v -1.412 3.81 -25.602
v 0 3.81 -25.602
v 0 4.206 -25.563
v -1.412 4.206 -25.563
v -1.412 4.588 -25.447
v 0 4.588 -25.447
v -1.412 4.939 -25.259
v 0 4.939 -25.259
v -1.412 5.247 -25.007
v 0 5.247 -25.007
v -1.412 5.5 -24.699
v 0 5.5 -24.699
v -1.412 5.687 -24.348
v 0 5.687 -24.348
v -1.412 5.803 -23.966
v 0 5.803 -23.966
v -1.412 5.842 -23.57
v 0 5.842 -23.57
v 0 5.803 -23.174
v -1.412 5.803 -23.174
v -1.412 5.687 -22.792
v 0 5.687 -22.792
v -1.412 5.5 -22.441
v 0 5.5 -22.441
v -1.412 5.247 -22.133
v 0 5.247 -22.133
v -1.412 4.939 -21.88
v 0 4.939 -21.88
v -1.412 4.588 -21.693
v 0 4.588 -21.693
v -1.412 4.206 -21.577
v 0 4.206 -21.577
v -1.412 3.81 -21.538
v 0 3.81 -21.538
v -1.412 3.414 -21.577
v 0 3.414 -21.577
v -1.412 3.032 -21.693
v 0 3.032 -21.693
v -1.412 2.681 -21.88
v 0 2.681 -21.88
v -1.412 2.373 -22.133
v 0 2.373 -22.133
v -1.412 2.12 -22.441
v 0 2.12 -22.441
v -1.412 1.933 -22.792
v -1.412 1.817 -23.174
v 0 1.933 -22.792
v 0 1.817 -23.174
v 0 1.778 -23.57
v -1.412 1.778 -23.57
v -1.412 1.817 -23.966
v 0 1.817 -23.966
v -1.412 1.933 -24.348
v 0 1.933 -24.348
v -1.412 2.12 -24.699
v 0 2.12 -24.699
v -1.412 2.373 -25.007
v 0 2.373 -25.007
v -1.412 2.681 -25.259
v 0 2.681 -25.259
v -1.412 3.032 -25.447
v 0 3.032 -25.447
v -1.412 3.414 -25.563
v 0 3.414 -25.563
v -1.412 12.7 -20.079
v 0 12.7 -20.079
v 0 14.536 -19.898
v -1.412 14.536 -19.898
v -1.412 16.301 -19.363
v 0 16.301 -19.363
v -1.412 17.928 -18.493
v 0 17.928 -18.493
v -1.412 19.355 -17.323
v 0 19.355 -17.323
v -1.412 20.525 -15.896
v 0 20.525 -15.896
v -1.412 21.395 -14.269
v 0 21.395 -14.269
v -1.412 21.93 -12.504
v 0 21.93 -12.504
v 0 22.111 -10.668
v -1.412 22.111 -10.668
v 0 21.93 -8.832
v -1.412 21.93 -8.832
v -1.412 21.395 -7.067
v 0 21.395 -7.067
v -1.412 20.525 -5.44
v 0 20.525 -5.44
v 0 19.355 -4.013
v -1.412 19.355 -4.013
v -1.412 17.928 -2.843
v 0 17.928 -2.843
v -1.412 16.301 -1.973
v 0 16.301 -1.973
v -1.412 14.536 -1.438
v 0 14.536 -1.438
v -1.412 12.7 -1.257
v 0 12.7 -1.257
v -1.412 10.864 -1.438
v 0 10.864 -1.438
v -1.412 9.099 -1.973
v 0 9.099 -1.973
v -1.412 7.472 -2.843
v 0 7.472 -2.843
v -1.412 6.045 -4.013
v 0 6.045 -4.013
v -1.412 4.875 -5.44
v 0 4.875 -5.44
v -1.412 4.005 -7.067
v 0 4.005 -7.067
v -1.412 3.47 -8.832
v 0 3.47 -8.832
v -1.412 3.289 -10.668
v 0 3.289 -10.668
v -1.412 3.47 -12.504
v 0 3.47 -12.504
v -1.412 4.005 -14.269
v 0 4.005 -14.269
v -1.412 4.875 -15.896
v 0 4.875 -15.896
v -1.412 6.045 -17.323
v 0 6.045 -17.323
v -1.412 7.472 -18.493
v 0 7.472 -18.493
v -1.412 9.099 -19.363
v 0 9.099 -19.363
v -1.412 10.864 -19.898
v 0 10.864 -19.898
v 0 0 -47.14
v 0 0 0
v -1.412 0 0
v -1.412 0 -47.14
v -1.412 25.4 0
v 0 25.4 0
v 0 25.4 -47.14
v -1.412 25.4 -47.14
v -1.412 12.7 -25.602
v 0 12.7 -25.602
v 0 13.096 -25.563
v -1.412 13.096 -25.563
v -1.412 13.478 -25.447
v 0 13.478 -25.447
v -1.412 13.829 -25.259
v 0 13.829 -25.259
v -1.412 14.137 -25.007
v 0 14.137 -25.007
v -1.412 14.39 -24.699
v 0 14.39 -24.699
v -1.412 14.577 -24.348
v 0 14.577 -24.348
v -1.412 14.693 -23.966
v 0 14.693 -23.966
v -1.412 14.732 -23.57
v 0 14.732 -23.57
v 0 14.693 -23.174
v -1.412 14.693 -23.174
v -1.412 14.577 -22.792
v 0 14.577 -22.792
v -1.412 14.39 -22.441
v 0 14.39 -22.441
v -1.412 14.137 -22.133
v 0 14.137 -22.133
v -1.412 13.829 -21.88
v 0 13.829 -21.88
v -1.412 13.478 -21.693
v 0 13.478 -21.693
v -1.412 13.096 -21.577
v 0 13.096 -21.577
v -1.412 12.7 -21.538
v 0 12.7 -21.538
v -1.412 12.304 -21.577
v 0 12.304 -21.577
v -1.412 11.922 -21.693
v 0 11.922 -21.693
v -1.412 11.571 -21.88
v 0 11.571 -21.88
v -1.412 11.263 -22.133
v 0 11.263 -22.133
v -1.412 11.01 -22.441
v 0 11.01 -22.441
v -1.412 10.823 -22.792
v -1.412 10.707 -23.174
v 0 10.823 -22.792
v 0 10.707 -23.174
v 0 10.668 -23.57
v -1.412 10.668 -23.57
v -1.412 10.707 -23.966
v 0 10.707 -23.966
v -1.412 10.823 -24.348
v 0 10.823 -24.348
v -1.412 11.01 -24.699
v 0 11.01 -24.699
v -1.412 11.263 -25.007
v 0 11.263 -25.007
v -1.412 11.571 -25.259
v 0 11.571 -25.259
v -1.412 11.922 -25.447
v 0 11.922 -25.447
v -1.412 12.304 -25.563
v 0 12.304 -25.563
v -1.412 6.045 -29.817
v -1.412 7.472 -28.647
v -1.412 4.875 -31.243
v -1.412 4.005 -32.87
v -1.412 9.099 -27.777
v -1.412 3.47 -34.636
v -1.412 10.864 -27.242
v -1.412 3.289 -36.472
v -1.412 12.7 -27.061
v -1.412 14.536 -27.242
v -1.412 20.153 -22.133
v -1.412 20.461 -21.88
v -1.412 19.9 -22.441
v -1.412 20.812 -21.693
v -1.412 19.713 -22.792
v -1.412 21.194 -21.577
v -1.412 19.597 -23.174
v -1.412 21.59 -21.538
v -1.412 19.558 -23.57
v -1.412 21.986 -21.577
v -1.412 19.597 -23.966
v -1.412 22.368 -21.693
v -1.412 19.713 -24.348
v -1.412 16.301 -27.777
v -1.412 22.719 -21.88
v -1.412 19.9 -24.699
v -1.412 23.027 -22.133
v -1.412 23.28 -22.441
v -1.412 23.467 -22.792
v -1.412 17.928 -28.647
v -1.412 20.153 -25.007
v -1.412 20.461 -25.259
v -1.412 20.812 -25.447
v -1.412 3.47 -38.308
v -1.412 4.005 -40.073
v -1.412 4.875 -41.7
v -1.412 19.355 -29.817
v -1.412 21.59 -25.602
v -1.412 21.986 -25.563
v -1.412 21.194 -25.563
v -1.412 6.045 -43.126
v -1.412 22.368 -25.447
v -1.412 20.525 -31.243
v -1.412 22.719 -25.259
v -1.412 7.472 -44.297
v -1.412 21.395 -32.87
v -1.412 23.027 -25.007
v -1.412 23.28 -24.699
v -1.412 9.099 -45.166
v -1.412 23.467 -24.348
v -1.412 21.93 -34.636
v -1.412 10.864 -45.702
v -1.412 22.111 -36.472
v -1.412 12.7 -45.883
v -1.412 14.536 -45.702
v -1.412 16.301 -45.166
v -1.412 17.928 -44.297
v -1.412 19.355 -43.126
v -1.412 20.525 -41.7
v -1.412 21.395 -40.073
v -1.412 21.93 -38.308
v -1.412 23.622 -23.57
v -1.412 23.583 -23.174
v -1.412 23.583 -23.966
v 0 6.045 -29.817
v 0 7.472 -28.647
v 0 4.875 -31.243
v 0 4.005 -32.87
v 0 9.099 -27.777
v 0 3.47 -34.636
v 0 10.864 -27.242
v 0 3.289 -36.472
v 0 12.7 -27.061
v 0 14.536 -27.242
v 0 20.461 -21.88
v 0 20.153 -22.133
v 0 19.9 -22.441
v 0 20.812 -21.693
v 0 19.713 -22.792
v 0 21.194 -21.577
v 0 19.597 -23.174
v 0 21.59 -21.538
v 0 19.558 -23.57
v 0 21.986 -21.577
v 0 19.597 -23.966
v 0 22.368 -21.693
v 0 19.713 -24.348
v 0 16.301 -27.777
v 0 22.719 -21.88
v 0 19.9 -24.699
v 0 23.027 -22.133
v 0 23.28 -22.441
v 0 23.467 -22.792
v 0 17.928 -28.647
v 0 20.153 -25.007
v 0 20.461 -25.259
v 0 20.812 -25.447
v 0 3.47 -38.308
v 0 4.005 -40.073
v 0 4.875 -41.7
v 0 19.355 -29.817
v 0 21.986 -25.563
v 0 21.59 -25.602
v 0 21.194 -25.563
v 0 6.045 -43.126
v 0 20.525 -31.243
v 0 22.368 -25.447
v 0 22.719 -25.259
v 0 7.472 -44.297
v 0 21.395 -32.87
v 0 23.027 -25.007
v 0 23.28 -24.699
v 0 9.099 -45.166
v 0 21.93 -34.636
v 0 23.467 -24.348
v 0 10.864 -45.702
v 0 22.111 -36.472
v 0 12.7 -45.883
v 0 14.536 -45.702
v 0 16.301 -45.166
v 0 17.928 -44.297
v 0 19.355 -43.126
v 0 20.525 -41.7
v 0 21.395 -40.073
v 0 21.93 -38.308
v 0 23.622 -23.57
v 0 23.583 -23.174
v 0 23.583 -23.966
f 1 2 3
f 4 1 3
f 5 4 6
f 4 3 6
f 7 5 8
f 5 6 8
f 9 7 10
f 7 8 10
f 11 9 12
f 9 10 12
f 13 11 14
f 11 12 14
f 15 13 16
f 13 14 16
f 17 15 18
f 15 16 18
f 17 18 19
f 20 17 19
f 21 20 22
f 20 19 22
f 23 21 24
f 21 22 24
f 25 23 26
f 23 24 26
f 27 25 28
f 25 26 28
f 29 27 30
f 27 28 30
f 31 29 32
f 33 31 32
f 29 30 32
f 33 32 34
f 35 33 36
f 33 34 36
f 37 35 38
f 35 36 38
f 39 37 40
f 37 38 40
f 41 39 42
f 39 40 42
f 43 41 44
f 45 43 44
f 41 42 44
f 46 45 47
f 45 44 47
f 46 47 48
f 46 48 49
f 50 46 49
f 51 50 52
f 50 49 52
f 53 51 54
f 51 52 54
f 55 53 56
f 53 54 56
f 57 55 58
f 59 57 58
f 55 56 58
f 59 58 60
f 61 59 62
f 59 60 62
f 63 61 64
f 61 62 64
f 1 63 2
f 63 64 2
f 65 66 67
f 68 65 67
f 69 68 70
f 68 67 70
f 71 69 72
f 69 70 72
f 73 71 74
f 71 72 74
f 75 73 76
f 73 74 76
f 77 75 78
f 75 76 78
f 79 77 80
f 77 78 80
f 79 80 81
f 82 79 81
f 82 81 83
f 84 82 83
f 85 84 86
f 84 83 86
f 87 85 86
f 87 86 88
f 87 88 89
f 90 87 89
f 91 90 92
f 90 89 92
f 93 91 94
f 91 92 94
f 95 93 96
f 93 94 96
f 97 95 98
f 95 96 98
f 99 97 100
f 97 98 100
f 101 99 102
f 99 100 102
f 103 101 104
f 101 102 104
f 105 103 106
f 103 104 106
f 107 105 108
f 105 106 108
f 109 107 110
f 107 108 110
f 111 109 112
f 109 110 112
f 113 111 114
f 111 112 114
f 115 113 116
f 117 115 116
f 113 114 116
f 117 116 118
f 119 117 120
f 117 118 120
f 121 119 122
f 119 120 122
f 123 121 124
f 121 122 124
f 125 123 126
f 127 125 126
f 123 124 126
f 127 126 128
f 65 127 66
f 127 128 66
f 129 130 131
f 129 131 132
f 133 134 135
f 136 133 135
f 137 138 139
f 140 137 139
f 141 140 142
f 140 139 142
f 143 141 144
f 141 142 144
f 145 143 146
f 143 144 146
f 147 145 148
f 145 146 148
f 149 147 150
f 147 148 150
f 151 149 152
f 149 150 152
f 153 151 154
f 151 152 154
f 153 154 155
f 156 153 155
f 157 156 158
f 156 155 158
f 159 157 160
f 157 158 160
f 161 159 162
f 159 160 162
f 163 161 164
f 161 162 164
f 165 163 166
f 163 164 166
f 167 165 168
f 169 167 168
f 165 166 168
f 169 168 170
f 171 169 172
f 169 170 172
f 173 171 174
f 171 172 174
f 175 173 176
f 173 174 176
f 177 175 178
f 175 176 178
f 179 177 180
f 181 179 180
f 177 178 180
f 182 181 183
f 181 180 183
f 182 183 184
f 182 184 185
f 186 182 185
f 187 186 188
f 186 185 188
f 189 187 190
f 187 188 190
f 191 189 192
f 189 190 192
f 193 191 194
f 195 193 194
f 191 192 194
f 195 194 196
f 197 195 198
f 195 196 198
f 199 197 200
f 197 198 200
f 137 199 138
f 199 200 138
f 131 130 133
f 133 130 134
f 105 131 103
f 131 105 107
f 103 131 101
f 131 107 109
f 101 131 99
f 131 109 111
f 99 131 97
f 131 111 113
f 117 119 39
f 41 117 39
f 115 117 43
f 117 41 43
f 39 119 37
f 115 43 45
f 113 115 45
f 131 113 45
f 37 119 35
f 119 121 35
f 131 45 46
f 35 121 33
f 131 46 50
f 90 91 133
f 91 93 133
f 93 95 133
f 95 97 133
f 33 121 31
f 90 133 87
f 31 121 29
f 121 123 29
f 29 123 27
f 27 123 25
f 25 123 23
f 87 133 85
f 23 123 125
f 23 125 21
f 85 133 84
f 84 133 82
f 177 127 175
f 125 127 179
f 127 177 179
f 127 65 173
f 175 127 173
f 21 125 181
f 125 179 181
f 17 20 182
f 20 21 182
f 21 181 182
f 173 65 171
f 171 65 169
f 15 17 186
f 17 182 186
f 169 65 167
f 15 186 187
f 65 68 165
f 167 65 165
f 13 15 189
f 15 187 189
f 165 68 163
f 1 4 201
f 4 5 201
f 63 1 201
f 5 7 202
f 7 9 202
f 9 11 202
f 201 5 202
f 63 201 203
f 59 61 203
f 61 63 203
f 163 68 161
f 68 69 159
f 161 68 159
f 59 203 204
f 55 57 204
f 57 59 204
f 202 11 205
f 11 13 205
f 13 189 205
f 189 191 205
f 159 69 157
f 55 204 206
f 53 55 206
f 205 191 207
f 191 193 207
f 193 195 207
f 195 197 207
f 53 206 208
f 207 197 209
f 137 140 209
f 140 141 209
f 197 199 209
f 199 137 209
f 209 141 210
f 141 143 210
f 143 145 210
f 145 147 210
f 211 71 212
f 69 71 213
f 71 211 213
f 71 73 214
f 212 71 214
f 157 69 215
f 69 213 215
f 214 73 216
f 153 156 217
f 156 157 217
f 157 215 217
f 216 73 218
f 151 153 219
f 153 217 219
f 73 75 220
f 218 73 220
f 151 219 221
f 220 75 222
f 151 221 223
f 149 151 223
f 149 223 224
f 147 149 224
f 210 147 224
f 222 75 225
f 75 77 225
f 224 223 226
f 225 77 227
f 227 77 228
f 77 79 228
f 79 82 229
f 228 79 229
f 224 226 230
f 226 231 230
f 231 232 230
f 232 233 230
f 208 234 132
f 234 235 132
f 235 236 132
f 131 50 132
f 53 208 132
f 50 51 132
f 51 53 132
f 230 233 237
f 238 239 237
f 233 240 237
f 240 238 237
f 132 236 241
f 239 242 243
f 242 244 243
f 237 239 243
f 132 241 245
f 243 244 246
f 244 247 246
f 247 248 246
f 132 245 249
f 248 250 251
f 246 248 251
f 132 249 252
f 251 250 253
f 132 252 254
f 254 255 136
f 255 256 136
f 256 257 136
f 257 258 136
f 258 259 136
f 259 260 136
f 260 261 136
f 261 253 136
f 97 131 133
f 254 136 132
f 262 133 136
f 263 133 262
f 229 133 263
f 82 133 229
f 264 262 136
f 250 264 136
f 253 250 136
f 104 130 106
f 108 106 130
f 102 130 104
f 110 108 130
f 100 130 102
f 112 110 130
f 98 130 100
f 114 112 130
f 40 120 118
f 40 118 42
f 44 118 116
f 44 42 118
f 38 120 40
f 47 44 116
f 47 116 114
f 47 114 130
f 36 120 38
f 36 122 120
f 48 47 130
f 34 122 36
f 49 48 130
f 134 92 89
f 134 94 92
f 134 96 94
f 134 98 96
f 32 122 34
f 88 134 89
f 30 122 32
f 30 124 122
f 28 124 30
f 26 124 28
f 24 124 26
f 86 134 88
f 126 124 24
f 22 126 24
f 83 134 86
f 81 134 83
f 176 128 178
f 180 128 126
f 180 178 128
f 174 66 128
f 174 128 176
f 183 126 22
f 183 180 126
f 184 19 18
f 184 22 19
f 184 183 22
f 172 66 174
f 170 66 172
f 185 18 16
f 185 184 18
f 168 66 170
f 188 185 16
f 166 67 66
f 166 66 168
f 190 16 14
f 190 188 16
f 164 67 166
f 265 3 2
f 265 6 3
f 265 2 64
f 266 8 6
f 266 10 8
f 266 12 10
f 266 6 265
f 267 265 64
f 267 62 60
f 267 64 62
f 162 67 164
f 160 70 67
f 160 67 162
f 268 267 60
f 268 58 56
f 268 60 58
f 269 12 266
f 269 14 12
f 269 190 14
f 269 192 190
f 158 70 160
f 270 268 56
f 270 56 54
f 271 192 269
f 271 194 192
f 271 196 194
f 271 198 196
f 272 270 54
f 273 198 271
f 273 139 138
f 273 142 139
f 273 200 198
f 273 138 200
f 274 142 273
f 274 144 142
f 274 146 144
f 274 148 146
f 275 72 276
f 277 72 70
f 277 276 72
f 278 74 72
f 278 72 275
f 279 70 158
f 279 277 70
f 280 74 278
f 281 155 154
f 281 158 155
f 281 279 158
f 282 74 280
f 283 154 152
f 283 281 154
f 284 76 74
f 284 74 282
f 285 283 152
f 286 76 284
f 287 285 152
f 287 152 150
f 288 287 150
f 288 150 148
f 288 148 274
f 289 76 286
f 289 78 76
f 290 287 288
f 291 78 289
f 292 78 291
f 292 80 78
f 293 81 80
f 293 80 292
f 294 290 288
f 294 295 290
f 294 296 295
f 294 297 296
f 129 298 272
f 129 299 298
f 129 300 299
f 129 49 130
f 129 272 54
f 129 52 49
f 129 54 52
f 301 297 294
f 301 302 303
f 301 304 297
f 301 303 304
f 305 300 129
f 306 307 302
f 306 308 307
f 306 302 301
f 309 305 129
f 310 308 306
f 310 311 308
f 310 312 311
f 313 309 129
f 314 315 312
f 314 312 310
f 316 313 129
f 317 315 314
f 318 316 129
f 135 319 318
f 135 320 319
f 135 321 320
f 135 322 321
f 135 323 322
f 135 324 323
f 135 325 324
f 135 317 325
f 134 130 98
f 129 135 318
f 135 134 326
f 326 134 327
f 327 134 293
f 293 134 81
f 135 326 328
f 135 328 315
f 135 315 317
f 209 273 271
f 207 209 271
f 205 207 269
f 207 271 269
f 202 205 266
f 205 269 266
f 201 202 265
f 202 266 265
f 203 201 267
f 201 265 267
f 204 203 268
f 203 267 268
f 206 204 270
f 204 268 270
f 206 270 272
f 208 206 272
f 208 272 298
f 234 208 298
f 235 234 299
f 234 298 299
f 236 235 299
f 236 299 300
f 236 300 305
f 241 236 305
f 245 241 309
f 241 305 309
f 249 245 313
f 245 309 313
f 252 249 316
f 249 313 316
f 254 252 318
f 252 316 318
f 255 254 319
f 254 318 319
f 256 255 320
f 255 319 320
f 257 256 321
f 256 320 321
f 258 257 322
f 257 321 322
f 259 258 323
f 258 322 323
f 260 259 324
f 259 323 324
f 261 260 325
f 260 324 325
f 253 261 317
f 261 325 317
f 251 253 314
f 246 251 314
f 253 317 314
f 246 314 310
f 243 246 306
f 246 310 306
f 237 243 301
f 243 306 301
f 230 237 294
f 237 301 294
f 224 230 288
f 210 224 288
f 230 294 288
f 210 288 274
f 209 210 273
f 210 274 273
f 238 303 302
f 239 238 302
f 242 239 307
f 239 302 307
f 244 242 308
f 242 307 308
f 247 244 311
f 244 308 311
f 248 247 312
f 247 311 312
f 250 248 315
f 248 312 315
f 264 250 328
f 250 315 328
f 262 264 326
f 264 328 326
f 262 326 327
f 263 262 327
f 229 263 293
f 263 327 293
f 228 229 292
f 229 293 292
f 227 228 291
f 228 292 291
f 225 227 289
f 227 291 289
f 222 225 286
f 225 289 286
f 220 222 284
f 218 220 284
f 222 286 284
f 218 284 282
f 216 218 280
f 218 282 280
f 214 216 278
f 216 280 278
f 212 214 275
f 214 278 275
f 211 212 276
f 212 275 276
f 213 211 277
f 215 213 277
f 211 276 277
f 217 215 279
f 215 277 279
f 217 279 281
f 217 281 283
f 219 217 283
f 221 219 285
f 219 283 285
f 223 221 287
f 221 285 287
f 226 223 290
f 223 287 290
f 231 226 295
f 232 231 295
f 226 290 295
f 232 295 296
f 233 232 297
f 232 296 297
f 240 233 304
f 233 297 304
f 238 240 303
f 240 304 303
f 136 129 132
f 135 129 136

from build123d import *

# Parameters (mm, degrees)
SKETCH2_W           = 47.13986
SKETCH2_H           = 25.4
SKETCH2_R           = 2.032
SKETCH2_R_2         = 9.411008891
BOSS_EXTRUDE1_DEPTH = 1.41224


with BuildPart() as part:
    # Sketch2 → Boss-Extrude1 (new body)
    with BuildSketch(Plane(origin=(0, 0, 0), x_dir=(0, 0, -1), z_dir=(1, 0, 0))):
        with Locations((23.56993, 12.7)):
            Rectangle(SKETCH2_W, SKETCH2_H)
        with Locations((23.56993, 21.59)):
            Circle(SKETCH2_R, mode=Mode.SUBTRACT)
        with Locations((23.56993, 12.7)):
            Circle(SKETCH2_R, mode=Mode.SUBTRACT)
        with Locations((23.56993, 3.81)):
            Circle(SKETCH2_R, mode=Mode.SUBTRACT)
        with Locations((10.668, 12.7)):
            Circle(SKETCH2_R_2, mode=Mode.SUBTRACT)
        with Locations(Location((36.47186, 12.7, 0), (0, 0, 180))):
            Circle(SKETCH2_R_2, mode=Mode.SUBTRACT)
    extrude(amount=-BOSS_EXTRUDE1_DEPTH)


solid = part.part
